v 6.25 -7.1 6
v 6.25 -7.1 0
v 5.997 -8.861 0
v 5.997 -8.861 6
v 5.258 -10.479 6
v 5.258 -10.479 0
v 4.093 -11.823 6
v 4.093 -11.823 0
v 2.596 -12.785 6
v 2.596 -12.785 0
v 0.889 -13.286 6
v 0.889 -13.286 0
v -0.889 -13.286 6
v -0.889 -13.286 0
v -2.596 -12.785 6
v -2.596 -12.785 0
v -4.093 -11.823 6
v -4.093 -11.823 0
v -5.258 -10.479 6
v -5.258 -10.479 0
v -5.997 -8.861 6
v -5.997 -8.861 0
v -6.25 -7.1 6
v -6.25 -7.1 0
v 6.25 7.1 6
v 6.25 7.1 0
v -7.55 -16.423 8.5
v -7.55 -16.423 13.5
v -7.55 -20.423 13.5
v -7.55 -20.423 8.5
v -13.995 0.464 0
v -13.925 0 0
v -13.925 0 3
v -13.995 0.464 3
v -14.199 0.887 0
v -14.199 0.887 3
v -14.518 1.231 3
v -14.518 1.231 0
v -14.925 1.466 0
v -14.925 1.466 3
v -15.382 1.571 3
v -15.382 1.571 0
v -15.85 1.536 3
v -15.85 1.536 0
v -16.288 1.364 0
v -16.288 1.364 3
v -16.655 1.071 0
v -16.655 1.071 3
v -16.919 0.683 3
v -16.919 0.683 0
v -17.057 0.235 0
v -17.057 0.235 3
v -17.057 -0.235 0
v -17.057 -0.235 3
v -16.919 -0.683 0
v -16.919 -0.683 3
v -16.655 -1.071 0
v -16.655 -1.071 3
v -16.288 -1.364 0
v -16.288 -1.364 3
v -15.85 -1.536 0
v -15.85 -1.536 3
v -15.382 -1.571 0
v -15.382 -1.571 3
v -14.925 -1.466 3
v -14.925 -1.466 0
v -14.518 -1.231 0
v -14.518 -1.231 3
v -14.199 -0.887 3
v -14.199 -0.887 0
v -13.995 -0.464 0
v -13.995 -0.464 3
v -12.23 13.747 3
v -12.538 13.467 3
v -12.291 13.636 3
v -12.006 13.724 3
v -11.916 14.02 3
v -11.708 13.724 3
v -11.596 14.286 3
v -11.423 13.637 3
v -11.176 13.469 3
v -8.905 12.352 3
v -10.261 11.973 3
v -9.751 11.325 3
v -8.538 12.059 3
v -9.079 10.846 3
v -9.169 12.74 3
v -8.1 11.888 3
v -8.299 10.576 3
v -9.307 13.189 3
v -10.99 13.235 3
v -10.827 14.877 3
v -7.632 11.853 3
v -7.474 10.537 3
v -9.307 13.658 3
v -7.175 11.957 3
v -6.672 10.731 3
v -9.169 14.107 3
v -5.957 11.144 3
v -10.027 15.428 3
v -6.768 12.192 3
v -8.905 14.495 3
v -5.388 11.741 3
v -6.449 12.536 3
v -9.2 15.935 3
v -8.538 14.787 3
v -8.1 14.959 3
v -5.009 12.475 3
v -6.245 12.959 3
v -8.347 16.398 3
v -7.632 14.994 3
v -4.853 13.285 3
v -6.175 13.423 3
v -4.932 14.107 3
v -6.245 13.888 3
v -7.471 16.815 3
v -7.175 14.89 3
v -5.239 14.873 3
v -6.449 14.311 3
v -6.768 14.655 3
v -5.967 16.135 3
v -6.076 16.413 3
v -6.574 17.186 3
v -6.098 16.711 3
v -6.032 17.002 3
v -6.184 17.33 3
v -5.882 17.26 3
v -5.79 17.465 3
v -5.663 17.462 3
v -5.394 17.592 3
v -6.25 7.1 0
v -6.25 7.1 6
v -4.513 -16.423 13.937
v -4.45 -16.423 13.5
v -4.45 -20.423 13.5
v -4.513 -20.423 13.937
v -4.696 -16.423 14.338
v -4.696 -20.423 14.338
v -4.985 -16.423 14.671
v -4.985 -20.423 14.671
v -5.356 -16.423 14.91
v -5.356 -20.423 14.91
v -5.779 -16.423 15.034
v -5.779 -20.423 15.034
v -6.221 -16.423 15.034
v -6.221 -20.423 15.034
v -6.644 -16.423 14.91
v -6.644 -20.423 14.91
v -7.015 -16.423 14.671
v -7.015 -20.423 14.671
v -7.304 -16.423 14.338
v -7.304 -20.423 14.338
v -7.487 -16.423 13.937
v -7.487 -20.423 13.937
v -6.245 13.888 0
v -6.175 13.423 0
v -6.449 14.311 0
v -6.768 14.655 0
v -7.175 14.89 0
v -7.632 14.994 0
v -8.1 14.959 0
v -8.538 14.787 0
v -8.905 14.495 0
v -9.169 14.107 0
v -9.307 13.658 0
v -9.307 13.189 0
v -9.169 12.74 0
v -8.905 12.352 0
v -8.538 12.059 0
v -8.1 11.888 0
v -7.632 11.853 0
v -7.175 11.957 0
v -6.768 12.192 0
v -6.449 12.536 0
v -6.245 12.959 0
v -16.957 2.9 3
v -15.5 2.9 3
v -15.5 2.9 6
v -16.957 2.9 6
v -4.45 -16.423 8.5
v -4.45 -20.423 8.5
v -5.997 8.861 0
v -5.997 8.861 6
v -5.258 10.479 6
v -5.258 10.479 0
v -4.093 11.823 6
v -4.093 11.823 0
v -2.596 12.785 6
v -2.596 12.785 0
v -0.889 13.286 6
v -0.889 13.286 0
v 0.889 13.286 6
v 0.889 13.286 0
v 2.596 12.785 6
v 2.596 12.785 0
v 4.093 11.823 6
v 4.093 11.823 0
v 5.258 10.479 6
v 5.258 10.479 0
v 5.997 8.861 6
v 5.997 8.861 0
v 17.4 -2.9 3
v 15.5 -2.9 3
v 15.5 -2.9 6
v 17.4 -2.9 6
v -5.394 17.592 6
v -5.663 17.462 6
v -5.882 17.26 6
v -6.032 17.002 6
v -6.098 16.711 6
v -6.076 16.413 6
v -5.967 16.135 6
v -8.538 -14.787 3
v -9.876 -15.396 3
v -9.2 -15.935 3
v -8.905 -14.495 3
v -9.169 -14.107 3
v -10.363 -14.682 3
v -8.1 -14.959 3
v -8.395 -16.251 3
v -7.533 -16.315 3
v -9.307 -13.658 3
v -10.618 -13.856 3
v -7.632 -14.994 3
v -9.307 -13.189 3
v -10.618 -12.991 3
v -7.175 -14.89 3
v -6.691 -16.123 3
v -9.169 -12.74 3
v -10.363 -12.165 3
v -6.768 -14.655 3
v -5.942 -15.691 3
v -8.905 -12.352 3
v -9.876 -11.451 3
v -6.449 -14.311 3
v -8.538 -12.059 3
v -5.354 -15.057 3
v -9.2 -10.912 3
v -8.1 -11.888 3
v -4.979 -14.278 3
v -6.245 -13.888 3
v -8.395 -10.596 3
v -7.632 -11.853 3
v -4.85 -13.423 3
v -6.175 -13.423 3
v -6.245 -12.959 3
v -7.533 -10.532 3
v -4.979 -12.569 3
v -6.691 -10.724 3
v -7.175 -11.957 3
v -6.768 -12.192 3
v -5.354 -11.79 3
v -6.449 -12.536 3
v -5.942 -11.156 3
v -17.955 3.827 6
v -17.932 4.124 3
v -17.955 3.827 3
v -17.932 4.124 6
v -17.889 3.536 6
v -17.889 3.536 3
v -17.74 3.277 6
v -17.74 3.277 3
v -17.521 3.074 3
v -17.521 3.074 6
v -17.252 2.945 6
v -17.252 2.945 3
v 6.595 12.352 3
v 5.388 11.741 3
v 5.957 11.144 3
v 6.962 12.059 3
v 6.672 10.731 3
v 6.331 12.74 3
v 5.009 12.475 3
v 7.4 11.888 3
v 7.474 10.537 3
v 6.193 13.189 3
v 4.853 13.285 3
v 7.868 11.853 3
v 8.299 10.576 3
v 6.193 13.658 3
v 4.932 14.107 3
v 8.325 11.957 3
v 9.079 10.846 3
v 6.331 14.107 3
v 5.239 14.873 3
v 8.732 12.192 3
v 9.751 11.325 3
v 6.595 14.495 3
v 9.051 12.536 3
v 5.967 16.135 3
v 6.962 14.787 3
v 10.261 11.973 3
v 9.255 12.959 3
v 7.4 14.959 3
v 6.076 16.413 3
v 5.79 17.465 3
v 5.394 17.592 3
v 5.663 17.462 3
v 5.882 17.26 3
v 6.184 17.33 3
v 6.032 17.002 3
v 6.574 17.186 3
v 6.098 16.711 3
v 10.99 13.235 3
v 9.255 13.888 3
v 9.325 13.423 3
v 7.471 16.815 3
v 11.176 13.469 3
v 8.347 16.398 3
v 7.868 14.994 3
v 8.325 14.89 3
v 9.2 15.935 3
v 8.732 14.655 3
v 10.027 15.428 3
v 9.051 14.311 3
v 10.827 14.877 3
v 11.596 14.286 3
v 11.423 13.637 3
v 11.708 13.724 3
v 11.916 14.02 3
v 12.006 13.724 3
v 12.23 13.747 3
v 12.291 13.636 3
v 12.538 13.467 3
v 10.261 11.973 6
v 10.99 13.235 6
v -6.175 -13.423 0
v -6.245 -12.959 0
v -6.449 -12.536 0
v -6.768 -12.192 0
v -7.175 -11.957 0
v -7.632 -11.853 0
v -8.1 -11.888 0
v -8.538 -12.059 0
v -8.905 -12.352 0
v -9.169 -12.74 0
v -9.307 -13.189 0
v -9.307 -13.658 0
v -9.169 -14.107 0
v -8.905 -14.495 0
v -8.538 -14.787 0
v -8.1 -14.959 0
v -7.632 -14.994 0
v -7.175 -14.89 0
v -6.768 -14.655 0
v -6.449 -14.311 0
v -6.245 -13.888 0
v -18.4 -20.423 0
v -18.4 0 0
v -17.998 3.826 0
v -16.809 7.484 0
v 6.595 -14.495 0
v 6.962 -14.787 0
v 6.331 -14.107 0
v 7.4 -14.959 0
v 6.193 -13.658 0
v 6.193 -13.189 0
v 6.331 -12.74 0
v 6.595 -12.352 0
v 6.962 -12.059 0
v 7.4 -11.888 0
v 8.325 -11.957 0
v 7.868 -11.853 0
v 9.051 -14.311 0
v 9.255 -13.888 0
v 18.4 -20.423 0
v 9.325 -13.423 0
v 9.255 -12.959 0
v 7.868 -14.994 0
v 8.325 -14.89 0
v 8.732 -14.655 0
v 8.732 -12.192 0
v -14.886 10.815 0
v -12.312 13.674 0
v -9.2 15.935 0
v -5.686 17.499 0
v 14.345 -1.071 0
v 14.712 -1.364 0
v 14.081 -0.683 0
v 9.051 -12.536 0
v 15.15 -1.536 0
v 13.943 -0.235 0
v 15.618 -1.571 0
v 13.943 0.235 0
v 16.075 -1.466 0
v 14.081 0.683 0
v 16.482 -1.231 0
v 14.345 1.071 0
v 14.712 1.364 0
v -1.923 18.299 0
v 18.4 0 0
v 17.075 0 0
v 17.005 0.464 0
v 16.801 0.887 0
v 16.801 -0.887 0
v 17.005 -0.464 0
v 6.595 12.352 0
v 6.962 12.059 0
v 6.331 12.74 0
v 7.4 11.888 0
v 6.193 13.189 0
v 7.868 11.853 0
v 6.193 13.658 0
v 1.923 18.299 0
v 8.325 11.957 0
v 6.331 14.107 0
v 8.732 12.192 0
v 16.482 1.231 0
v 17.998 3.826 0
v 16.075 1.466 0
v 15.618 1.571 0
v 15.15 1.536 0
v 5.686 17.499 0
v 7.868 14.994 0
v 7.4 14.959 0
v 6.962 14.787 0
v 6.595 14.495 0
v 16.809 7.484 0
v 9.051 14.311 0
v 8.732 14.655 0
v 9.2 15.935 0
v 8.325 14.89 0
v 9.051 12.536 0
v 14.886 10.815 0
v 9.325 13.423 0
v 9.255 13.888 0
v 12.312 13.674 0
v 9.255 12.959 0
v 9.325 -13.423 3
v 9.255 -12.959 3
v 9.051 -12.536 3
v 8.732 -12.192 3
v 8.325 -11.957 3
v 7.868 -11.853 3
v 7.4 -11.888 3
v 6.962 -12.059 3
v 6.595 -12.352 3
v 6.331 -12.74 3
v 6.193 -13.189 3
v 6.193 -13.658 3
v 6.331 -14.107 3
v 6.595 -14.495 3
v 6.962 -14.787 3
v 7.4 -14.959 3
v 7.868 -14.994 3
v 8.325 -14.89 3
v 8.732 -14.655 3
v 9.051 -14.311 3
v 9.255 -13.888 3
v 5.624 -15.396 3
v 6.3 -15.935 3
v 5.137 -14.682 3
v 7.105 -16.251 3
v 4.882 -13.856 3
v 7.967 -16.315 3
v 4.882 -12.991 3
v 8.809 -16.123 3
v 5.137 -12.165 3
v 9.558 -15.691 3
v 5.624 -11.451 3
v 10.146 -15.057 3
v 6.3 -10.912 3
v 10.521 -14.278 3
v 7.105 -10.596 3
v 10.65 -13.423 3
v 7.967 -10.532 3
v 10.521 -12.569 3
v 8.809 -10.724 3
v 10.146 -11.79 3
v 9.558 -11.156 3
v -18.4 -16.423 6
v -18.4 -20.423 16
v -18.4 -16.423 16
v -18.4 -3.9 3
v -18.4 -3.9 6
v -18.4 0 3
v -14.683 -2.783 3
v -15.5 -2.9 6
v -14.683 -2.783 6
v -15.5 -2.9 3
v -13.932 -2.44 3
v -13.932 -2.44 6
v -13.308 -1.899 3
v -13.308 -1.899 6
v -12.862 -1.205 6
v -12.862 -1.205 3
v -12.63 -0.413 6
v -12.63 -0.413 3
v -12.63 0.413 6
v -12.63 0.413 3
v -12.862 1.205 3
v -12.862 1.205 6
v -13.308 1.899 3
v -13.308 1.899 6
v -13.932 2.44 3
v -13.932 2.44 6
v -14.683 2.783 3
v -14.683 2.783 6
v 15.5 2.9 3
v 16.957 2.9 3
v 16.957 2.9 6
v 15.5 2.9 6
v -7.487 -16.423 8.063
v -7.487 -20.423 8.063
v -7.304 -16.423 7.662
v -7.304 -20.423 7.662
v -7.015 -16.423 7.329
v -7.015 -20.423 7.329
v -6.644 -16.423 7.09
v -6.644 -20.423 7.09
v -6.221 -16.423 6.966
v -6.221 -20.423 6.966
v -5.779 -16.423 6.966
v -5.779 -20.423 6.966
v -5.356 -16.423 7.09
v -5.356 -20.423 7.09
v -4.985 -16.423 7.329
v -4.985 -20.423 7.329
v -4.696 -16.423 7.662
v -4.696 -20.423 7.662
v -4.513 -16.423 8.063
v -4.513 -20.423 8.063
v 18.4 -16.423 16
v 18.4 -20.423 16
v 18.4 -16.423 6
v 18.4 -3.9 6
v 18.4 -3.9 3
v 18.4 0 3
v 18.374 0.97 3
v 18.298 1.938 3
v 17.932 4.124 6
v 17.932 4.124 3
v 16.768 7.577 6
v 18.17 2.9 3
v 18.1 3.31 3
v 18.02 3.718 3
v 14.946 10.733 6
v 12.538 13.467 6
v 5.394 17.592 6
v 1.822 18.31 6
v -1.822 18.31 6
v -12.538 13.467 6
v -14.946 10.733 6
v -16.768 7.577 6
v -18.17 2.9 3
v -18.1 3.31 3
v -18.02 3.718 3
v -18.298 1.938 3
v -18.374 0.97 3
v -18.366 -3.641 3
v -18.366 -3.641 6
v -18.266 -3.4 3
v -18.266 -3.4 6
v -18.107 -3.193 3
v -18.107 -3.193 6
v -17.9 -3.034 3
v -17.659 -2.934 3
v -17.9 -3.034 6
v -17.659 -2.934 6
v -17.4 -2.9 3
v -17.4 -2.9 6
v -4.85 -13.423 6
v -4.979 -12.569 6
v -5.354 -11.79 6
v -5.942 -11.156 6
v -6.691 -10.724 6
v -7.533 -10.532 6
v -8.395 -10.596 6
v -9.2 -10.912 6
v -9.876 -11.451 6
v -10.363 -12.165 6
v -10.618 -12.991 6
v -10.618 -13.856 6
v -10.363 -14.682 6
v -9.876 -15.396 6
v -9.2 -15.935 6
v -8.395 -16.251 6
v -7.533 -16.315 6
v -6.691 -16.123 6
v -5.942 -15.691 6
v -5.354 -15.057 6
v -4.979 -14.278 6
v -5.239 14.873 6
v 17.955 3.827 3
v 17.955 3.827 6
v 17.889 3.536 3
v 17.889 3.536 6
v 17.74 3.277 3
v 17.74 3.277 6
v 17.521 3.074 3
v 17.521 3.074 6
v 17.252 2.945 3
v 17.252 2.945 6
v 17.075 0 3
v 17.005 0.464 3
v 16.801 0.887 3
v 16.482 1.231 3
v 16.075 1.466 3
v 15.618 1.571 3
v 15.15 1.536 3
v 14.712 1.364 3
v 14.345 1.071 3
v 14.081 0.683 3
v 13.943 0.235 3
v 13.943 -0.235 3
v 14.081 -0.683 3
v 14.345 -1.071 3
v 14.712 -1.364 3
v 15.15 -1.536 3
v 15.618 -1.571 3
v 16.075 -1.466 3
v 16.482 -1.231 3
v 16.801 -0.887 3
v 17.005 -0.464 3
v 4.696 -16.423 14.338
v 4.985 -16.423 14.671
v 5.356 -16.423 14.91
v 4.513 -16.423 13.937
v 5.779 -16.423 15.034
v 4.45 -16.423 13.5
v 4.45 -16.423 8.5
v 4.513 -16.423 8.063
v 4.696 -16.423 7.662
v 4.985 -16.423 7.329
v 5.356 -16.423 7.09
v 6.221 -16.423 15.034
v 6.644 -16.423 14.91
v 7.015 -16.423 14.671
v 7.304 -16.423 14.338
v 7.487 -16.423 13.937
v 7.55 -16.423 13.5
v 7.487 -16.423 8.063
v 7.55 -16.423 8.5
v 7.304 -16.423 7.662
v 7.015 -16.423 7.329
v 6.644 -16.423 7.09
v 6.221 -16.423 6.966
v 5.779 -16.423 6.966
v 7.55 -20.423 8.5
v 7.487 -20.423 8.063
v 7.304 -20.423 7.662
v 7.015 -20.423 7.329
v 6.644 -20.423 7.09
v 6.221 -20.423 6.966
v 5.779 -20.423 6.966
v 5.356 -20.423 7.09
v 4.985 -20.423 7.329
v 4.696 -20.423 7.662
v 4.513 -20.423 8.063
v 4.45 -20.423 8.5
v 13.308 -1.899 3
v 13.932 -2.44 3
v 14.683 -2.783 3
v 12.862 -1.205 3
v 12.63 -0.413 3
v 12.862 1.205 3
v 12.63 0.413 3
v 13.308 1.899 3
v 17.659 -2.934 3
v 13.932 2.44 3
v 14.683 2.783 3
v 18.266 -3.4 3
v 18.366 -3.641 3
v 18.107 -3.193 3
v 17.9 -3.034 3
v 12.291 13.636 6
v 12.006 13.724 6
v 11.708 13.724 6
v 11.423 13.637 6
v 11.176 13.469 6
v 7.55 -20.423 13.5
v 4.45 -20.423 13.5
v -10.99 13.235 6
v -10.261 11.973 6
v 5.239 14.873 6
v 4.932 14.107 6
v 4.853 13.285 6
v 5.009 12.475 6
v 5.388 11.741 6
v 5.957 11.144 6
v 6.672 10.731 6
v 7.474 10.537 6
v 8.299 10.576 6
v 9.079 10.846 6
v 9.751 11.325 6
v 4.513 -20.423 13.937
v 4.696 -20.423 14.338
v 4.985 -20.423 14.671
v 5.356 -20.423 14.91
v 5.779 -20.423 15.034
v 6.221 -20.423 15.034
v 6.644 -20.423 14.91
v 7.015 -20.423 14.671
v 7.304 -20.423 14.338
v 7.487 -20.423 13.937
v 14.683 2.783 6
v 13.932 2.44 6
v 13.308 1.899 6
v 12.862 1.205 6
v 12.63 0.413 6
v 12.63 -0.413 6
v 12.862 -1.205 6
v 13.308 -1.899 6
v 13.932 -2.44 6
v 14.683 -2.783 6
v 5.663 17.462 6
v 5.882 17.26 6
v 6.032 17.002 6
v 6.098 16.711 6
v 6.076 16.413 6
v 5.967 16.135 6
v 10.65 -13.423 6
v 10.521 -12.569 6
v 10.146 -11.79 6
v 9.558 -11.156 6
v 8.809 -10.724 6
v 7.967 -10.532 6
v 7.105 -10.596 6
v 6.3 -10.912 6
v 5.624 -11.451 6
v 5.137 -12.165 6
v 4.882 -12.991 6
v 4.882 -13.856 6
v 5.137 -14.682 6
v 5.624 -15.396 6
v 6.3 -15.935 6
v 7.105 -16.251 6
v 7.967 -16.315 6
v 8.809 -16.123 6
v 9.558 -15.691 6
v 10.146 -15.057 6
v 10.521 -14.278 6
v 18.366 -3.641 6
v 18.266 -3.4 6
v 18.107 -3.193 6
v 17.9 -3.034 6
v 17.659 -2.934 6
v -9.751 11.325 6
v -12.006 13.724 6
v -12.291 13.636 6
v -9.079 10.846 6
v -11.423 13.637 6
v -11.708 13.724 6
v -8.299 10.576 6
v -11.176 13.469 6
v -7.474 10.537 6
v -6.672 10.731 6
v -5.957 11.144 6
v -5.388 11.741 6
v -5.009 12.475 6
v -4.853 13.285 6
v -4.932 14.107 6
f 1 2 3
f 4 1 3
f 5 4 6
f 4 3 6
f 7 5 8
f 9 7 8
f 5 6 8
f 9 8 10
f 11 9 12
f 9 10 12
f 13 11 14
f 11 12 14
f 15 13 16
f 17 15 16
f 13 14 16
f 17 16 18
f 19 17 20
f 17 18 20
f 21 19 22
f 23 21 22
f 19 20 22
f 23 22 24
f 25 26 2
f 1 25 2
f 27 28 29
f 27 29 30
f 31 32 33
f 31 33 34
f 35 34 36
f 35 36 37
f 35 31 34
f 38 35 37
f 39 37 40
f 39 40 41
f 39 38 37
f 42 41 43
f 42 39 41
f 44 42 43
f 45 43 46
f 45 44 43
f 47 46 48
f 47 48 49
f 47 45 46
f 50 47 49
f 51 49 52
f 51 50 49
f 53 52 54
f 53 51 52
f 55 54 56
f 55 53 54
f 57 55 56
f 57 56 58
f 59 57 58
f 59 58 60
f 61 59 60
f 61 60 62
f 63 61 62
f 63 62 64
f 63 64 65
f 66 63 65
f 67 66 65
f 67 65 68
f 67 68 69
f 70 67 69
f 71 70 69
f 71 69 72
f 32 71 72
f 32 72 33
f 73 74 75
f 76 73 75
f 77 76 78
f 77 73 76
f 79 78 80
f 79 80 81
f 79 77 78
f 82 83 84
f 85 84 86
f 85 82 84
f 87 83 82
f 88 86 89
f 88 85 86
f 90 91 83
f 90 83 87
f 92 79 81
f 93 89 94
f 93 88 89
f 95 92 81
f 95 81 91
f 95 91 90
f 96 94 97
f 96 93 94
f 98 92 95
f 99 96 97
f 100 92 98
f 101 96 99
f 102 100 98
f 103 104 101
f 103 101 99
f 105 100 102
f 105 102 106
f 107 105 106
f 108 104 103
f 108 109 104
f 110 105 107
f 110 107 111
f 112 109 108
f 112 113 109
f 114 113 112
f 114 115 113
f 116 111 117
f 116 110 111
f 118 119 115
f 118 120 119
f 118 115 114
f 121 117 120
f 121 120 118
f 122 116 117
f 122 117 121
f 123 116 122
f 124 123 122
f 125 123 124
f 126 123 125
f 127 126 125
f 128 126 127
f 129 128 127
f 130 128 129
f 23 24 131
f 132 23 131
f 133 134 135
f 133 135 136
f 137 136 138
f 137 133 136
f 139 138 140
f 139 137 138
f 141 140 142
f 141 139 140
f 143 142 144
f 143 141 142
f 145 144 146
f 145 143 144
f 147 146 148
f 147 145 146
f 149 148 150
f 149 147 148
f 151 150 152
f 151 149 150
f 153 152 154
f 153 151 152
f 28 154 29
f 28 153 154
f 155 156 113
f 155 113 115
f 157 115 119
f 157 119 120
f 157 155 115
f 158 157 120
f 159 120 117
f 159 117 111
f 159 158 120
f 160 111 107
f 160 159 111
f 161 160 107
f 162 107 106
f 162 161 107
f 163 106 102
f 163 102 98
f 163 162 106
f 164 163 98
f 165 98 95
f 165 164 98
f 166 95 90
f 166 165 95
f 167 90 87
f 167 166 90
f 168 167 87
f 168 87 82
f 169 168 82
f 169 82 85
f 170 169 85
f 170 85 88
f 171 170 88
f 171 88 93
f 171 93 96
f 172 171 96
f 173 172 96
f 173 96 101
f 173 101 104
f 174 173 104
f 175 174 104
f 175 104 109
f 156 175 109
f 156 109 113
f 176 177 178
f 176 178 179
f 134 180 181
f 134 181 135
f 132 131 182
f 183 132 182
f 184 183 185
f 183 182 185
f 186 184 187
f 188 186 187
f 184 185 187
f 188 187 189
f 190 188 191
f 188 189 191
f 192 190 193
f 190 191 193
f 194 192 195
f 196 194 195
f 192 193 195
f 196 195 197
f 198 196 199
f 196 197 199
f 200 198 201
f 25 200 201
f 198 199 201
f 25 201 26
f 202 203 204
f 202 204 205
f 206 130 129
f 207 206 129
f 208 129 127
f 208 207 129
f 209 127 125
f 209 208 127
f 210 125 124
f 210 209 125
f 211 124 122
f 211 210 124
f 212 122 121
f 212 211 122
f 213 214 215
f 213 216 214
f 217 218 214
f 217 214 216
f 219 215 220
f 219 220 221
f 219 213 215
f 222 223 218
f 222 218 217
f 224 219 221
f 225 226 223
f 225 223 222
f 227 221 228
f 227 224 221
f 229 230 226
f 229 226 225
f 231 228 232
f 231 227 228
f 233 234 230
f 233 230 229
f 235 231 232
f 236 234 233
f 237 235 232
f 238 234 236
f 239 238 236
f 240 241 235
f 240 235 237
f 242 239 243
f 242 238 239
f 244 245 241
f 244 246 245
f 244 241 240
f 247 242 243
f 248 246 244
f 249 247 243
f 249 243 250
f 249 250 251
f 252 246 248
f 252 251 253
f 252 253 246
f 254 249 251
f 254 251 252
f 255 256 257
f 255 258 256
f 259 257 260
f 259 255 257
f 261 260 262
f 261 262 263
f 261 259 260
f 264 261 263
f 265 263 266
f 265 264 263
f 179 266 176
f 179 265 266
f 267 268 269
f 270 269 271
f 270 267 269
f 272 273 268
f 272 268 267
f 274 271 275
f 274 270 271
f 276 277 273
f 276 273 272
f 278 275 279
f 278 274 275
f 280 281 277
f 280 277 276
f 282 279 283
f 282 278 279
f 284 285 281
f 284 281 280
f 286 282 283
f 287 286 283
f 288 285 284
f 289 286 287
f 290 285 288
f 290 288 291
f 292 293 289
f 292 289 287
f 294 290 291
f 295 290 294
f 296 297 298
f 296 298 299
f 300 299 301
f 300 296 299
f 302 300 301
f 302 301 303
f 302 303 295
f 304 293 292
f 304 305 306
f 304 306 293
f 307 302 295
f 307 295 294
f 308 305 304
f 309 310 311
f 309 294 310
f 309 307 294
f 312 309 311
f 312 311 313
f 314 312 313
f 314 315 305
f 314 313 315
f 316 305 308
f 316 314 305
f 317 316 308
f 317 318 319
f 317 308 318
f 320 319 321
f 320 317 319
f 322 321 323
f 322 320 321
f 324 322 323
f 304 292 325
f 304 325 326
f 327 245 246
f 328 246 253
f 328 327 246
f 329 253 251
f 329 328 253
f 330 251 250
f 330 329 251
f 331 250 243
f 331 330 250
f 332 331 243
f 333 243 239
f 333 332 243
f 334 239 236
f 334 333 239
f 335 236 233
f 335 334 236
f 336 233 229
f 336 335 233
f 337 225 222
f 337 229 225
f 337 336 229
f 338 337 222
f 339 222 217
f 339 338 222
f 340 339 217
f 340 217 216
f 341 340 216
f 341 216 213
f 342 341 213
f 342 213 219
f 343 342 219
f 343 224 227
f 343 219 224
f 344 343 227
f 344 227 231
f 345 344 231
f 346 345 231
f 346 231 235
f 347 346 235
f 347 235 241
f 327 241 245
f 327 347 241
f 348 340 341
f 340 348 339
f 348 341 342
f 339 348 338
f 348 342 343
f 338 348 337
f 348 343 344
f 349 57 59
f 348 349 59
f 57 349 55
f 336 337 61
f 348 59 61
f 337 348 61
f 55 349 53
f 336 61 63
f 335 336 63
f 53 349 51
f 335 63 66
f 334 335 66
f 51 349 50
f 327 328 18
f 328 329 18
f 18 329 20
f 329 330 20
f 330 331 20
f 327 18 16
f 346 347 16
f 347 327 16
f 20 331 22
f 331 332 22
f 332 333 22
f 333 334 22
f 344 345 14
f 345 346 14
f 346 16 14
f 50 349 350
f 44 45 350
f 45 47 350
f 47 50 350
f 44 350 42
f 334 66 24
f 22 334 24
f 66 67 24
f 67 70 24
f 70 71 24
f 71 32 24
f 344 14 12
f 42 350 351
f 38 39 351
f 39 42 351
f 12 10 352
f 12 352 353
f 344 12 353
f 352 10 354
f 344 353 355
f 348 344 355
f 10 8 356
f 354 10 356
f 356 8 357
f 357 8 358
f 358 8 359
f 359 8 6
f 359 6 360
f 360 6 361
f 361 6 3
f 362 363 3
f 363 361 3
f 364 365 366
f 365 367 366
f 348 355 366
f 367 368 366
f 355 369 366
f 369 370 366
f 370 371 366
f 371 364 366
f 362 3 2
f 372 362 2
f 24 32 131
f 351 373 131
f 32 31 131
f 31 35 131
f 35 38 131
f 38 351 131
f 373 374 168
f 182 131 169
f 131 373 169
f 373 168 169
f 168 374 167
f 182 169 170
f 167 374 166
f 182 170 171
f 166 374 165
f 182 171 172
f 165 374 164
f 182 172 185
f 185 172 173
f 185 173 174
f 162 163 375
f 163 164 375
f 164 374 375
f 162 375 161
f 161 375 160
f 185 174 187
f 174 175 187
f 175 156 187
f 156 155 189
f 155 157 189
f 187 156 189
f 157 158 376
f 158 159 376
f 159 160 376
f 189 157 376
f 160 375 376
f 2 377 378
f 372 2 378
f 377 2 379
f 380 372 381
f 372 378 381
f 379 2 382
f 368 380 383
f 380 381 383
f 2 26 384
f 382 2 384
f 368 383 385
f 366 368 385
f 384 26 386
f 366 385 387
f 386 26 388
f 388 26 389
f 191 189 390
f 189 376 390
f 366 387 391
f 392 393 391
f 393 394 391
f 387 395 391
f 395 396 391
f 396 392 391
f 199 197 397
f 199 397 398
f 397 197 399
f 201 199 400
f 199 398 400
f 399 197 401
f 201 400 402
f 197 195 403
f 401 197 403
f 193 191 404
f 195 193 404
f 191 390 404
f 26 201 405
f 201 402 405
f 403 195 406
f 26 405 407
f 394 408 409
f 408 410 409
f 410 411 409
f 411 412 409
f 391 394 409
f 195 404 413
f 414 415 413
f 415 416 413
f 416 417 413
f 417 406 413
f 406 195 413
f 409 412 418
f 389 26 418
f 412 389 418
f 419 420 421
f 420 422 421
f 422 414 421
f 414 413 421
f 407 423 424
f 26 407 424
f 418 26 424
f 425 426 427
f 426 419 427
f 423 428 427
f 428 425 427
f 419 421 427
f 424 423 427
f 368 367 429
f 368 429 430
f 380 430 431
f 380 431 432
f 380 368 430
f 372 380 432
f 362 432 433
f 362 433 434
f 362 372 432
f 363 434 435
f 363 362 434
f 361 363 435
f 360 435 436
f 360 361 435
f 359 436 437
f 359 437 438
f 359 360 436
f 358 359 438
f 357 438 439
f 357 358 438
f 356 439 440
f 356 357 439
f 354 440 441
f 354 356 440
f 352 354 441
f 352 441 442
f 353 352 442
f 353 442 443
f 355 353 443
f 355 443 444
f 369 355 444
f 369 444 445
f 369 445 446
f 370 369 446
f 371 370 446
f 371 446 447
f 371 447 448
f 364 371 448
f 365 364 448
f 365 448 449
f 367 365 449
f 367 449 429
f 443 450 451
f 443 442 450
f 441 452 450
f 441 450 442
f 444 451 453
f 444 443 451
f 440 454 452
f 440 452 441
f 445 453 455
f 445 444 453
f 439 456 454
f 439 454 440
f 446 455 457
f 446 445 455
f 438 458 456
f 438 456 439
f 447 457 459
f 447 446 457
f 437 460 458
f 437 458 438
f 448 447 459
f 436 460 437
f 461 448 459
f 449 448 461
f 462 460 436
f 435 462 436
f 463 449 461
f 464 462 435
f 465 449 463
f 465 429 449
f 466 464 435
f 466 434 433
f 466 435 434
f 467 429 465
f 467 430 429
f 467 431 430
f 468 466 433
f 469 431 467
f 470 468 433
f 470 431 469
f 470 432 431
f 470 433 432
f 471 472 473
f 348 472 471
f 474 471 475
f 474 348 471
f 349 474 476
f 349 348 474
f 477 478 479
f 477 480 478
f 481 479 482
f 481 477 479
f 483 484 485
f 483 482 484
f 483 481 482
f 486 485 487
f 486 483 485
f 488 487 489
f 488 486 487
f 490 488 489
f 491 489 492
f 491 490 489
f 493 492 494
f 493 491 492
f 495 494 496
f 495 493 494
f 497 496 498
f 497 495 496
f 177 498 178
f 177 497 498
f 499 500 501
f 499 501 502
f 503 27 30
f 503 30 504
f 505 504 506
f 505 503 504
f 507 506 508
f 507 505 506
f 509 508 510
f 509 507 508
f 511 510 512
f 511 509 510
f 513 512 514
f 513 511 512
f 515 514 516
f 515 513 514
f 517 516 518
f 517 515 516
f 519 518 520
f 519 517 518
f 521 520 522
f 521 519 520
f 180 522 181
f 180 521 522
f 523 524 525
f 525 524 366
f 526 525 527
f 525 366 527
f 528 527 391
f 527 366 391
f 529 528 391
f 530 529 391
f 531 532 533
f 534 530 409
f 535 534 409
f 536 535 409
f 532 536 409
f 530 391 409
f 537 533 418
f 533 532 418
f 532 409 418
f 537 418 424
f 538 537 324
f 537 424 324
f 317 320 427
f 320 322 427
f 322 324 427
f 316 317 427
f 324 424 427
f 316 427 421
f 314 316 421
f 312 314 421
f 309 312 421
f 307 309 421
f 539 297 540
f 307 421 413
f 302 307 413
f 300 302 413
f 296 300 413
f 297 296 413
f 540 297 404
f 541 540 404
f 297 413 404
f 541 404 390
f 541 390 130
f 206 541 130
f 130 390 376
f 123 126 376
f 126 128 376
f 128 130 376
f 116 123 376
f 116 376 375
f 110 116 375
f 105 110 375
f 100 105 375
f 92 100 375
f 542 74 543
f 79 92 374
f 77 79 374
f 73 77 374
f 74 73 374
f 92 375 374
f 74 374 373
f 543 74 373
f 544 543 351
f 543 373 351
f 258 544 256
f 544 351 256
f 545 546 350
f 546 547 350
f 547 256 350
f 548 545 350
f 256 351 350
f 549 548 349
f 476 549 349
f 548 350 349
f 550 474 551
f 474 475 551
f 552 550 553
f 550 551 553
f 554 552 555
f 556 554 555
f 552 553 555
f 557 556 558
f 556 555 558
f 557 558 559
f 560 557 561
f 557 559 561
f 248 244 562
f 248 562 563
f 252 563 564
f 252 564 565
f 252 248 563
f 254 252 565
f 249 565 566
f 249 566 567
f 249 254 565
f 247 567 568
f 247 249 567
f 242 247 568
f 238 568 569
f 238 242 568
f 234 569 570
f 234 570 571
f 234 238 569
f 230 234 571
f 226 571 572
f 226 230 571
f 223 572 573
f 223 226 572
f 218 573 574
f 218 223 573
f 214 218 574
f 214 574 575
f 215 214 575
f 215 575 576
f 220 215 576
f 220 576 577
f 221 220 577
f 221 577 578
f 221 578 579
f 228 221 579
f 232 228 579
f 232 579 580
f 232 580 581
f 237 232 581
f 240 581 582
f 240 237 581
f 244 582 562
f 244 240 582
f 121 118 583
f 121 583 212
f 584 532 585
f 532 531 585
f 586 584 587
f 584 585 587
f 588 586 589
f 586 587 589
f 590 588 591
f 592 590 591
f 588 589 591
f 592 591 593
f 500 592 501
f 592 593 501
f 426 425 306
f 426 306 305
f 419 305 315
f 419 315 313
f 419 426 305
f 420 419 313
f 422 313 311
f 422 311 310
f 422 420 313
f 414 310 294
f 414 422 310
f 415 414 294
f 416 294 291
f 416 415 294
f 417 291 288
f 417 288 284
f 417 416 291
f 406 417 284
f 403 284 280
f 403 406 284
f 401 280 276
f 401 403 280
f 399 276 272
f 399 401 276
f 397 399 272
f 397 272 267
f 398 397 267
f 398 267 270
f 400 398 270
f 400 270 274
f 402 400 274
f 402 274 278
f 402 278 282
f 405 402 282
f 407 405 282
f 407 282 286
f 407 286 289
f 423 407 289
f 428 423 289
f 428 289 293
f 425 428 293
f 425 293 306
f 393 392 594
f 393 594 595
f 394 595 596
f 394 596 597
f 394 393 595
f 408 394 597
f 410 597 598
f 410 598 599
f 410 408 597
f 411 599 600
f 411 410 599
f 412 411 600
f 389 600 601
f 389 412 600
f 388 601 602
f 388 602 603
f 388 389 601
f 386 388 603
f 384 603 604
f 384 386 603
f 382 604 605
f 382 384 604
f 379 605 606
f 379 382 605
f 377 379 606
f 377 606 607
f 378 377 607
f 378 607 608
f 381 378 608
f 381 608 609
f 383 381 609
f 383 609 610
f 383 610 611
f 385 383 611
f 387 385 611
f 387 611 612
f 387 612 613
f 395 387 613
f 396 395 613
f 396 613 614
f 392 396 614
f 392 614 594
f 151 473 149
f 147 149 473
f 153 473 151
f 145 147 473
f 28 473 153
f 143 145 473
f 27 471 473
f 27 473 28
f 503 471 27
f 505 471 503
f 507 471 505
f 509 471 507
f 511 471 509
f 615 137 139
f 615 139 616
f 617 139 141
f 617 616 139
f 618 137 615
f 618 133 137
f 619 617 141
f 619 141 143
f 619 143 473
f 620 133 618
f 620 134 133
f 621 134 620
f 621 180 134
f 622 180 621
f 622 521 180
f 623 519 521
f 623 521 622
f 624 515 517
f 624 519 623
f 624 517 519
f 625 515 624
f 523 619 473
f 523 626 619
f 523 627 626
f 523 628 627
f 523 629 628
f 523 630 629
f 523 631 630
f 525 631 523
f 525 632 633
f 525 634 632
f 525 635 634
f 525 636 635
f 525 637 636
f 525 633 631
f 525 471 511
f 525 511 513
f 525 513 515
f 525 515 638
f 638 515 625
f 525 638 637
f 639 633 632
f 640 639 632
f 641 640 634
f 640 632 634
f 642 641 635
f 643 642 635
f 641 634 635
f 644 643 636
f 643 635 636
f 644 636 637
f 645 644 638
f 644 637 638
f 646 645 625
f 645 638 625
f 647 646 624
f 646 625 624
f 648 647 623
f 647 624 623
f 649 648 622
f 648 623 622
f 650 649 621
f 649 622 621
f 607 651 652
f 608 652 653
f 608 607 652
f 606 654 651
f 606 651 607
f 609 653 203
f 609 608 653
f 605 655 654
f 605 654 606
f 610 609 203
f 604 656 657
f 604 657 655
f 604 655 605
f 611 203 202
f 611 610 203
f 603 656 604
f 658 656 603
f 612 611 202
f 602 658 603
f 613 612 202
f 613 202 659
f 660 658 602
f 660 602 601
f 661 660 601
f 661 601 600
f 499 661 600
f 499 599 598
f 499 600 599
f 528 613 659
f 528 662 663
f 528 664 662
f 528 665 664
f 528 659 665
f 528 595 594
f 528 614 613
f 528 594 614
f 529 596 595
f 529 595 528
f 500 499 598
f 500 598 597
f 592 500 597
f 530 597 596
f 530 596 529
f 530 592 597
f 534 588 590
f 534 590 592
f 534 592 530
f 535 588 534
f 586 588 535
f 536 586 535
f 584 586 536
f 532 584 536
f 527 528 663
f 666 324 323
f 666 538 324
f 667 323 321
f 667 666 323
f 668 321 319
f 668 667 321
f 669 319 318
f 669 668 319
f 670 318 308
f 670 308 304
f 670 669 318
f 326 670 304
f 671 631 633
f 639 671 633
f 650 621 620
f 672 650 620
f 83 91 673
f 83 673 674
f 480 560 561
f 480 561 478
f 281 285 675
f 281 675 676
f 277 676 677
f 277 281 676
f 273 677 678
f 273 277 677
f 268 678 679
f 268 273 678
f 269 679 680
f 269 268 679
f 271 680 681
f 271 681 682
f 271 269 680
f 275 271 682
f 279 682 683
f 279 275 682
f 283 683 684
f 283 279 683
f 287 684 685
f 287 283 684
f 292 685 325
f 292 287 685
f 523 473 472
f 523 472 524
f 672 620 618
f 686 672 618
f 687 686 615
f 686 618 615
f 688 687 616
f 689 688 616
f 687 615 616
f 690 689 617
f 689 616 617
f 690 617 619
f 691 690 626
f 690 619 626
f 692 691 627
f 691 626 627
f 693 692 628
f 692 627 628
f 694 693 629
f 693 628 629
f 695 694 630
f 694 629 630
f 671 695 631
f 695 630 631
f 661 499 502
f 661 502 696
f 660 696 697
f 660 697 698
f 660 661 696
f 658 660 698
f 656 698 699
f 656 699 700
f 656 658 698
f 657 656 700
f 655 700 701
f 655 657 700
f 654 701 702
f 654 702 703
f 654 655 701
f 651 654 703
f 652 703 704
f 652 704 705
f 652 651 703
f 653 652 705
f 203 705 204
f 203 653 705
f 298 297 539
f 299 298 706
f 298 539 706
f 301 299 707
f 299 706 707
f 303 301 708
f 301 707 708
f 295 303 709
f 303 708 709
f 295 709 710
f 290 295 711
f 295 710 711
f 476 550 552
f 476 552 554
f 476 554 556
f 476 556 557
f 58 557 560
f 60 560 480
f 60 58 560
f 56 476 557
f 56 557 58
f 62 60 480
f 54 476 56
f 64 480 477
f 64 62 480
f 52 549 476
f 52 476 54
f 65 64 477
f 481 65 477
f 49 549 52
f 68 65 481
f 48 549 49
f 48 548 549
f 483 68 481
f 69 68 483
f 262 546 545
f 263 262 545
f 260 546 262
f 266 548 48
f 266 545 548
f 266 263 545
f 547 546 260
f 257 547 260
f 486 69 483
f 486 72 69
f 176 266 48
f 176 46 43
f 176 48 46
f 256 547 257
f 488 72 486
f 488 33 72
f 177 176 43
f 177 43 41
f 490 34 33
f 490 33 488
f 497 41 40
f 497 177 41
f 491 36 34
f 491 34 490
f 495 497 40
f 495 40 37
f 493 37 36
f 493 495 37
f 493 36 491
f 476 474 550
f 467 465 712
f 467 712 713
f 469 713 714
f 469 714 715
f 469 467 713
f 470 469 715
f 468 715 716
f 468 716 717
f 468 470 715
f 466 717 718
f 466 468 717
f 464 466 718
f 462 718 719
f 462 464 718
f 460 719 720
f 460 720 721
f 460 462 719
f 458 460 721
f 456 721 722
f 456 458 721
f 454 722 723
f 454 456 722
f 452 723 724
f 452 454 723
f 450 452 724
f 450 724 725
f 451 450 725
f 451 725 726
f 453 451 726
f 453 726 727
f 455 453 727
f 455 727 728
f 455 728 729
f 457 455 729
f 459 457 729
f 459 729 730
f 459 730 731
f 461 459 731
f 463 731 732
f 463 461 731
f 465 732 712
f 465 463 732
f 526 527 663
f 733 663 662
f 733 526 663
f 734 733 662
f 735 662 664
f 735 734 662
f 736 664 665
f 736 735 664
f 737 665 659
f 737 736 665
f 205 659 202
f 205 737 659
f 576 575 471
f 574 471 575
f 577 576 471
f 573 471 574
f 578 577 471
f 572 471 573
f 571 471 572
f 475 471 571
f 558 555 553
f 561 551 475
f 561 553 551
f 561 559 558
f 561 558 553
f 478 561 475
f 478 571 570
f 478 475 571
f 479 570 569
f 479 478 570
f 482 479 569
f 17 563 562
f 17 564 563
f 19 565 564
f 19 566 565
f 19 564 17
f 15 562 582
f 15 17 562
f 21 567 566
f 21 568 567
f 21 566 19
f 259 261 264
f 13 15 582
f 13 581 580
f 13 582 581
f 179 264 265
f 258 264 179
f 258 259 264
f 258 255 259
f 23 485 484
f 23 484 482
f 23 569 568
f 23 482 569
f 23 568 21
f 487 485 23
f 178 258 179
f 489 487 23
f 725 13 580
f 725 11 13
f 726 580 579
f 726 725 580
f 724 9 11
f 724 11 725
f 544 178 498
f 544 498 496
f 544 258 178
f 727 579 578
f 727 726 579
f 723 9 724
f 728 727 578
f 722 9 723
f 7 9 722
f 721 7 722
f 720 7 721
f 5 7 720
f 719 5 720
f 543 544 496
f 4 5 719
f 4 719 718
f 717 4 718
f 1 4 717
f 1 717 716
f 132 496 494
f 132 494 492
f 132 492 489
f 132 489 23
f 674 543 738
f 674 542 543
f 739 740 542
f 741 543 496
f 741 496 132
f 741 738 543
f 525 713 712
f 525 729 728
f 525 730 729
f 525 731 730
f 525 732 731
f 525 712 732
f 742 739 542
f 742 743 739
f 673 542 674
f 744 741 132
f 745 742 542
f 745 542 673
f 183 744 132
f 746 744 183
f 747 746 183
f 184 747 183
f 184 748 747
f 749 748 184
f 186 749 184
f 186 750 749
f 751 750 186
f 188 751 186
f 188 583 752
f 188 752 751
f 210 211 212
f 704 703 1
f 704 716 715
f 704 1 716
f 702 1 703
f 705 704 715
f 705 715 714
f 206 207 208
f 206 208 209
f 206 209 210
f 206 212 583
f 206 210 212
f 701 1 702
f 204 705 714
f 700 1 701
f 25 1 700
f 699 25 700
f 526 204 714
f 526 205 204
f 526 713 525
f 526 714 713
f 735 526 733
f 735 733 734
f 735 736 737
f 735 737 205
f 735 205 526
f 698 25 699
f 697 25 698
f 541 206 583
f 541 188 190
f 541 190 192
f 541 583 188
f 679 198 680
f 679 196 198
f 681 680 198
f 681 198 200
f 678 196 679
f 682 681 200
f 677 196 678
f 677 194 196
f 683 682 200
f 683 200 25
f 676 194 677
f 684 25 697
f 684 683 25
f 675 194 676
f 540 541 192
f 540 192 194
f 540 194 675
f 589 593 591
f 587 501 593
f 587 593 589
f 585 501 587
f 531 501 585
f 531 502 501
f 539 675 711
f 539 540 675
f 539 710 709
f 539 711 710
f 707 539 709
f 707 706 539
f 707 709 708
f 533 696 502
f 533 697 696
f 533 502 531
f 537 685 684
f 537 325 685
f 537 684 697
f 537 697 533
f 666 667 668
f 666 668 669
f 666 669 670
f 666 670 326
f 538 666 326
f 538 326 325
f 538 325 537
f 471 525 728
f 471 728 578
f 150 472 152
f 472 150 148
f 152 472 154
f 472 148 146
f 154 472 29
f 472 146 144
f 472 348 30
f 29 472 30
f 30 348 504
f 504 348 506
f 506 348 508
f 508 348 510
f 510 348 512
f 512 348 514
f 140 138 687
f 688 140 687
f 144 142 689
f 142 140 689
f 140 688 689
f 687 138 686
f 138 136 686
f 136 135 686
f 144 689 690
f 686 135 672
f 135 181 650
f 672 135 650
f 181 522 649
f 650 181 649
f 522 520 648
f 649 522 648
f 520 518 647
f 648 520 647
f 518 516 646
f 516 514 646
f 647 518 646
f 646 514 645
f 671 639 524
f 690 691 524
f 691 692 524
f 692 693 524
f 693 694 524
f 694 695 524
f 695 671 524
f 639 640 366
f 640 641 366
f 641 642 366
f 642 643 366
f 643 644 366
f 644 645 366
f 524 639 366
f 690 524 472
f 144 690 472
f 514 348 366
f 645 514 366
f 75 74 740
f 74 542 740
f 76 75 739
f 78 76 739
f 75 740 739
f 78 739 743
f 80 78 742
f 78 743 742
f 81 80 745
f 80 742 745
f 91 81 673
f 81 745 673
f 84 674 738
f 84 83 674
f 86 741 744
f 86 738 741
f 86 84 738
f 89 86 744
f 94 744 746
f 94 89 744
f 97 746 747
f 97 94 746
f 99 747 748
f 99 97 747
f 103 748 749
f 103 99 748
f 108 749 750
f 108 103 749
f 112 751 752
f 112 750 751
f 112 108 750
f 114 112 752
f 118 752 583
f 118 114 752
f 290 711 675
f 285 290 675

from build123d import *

# Parameters (mm, degrees)
SKETCH1_R           = 1.575
BOSS_EXTRUDE1_DEPTH = 6
CUT_EXTRUDE3_START  = -3
SKETCH2_R           = 2.9
SKETCH2_R_2         = 1.575
CUT_EXTRUDE3_DEPTH  = 3
CUT_EXTRUDE4_START  = -3
SKETCH2_3_R         = 2.9
SKETCH2_3_R_2       = 1.575
CUT_EXTRUDE4_DEPTH  = 3
SKETCH3_W           = 36.8
SKETCH3_H           = 4
BOSS_EXTRUDE2_DEPTH = 16
CUT_EXTRUDE5_DEPTH  = 10
FILLET2_R           = 1


with BuildPart() as part:
    # Sketch1 → Boss-Extrude1 (new body)
    # profile 1 of 2: a face of its own
    with BuildSketch(Plane.XY):
        with BuildLine():
            ThreePointArc((18.4, 0), (0, 18.4), (-18.4, 0))
            ThreePointArc((-18.4, 0), (0, -18.4), (18.4, 0))
        make_face()
        with Locations((-7.75, -13.423393759)):
            Circle(SKETCH1_R, mode=Mode.SUBTRACT)
        with Locations((7.75, -13.423393759)):
            Circle(SKETCH1_R, mode=Mode.SUBTRACT)
        with Locations((-15.5, 0)):
            Circle(SKETCH1_R, mode=Mode.SUBTRACT)
        with Locations((-7.75, 13.423393759)):
            Circle(SKETCH1_R, mode=Mode.SUBTRACT)
        with BuildLine():
            ThreePointArc((6.25, -7.1), (0, -13.35), (-6.25, -7.1))
            Line((-6.25, -7.1), (-6.25, 7.1))
            ThreePointArc((-6.25, 7.1), (0, 13.35), (6.25, 7.1))
            Line((6.25, 7.1), (6.25, -7.1))
        make_face(mode=Mode.SUBTRACT)
        with Locations((15.5, 0)):
            Circle(SKETCH1_R, mode=Mode.SUBTRACT)
        with Locations((7.75, 13.423393759)):
            Circle(SKETCH1_R, mode=Mode.SUBTRACT)
    # profile 2 of 2: a face of its own
    with BuildSketch(Plane.XY):
        with BuildLine():
            ThreePointArc((18.4, 0), (0, -18.4), (-18.4, 0))
            Line((-18.4, 0), (-18.4, -19))
            Line((-18.4, -19), (18.4, -19))
            Line((18.4, -19), (18.4, 0))
        make_face()
    extrude(amount=BOSS_EXTRUDE1_DEPTH)

    # Sketch2 → Cut-Extrude3 (cut)
    # profile 1 of 12: a face of its own
    with BuildSketch(Plane.XY.offset(6).offset(CUT_EXTRUDE3_START)):
        with Locations((-15.5, 0)):
            Circle(SKETCH2_R)
        with Locations((-15.5, 0)):
            Circle(SKETCH2_R_2, mode=Mode.SUBTRACT)
    # profile 2 of 12: a face of its own
    with BuildSketch(Plane.XY.offset(6).offset(CUT_EXTRUDE3_START)):
        with BuildLine():
            ThreePointArc((-18.4, 0), (-17.550609665, 2.050609665), (-15.5, 2.9))
            Line((-15.5, 2.9), (-18.17003027, 2.9))
            ThreePointArc((-18.17003027, 2.9), (-18.342417466, 1.454551999), (-18.4, 0))
        make_face()
    # profile 3 of 12: a face of its own
    with BuildSketch(Plane.XY.offset(6).offset(CUT_EXTRUDE3_START)):
        with BuildLine():
            ThreePointArc((-15.5, -2.9), (-17.550609665, -2.050609665), (-18.4, 0))
            Line((-18.4, 0), (-18.4, -2.9))
            Line((-18.4, -2.9), (-15.5, -2.9))
        make_face()
    # profile 4 of 12: a face of its own
    with BuildSketch(Plane.XY.offset(6).offset(CUT_EXTRUDE3_START)):
        with BuildLine():
            ThreePointArc((-6.573541464, 17.185707801), (-7.911529831, 16.612275453), (-9.200000154, 15.934867341))
            ThreePointArc((-9.200000154, 15.934867341), (-6.999424855, 16.224578678), (-5.238526329, 14.873393759))
            Line((-5.238526329, 14.873393759), (-6.573541464, 17.185707801))
        make_face()
    # profile 5 of 12: a face of its own
    with BuildSketch(Plane.XY.offset(6).offset(CUT_EXTRUDE3_START)):
        with BuildLine():
            ThreePointArc((-9.200000154, 15.934867341), (-10.430887789, 15.157723442), (-11.596488806, 14.285707801))
            Line((-11.596488806, 14.285707801), (-10.261473671, 11.973393759))
            ThreePointArc((-10.261473671, 11.973393759), (-10.551184919, 14.173968903), (-9.200000154, 15.934867341))
        make_face()
    # profile 6 of 12: a face of its own
    with BuildSketch(Plane.XY.offset(6).offset(CUT_EXTRUDE3_START)):
        with Locations((-7.75, 13.423393759)):
            Circle(SKETCH2_R)
        with Locations((-7.75, 13.423393759)):
            Circle(SKETCH2_R_2, mode=Mode.SUBTRACT)
    # profile 7 of 12: a face of its own
    with BuildSketch(Plane.XY.offset(6).offset(CUT_EXTRUDE3_START)):
        with BuildLine():
            ThreePointArc((9.200000155, 15.93486734), (7.911529831, 16.612275453), (6.573541464, 17.185707801))
            Line((6.573541464, 17.185707801), (5.238526329, 14.873393759))
            ThreePointArc((5.238526329, 14.873393759), (6.999424856, 16.224578678), (9.200000155, 15.93486734))
        make_face()
    # profile 8 of 12: a face of its own
    with BuildSketch(Plane.XY.offset(6).offset(CUT_EXTRUDE3_START)):
        with Locations((7.75, 13.423393759)):
            Circle(SKETCH2_R)
        with Locations((7.75, 13.423393759)):
            Circle(SKETCH2_R_2, mode=Mode.SUBTRACT)
    # profile 9 of 12: a face of its own
    with BuildSketch(Plane.XY.offset(6).offset(CUT_EXTRUDE3_START)):
        with BuildLine():
            ThreePointArc((11.596488806, 14.285707801), (10.430887789, 15.157723441), (9.200000155, 15.93486734))
            ThreePointArc((9.200000155, 15.93486734), (10.261473716, 14.873393681), (10.65, 13.423393759))
            ThreePointArc((10.65, 13.423393759), (10.551184896, 12.672818528), (10.261473671, 11.973393759))
            Line((10.261473671, 11.973393759), (11.596488806, 14.285707801))
        make_face()
    # profile 10 of 12: a face of its own
    with BuildSketch(Plane.XY.offset(6).offset(CUT_EXTRUDE3_START)):
        with BuildLine():
            ThreePointArc((18.4, 0), (18.342417466, 1.454551999), (18.17003027, 2.9))
            Line((18.17003027, 2.9), (15.5, 2.9))
            ThreePointArc((15.5, 2.9), (17.550609665, 2.050609665), (18.4, 0))
        make_face()
    # profile 11 of 12: a face of its own
    with BuildSketch(Plane.XY.offset(6).offset(CUT_EXTRUDE3_START)):
        with Locations((15.5, 0)):
            Circle(SKETCH2_R)
        with Locations((15.5, 0)):
            Circle(SKETCH2_R_2, mode=Mode.SUBTRACT)
    # profile 12 of 12: a face of its own
    with BuildSketch(Plane.XY.offset(6).offset(CUT_EXTRUDE3_START)):
        with BuildLine():
            Line((18.4, -2.9), (18.4, 0))
            ThreePointArc((18.4, 0), (17.550609665, -2.050609665), (15.5, -2.9))
            Line((15.5, -2.9), (18.4, -2.9))
        make_face()
    extrude(amount=CUT_EXTRUDE3_DEPTH, mode=Mode.SUBTRACT)

    # Sketch2<3> → Cut-Extrude4 (cut)
    # profile 1 of 2: a face of its own
    with BuildSketch(Plane.XY.offset(6).offset(CUT_EXTRUDE4_START)):
        with Locations((7.75, -13.423393759)):
            Circle(SKETCH2_3_R)
        with Locations((7.75, -13.423393759)):
            Circle(SKETCH2_3_R_2, mode=Mode.SUBTRACT)
    # profile 2 of 2: a face of its own
    with BuildSketch(Plane.XY.offset(6).offset(CUT_EXTRUDE4_START)):
        with Locations((-7.75, -13.423393759)):
            Circle(SKETCH2_3_R)
    extrude(amount=CUT_EXTRUDE4_DEPTH, mode=Mode.SUBTRACT)

    # Sketch3 → Boss-Extrude2 (add)
    with BuildSketch(Plane.XY):
        with Locations((0, -18.423393759)):
            Rectangle(SKETCH3_W, SKETCH3_H)
    extrude(amount=BOSS_EXTRUDE2_DEPTH)

    # Sketch4 → Cut-Extrude5 (cut)
    with BuildSketch(Plane(origin=(0, -16.423393759, 0), x_dir=(1, 0, 0), z_dir=(0, 1, 0))):
        with BuildLine():
            Line((-4.45, -8.5), (-4.45, -13.5))
            ThreePointArc((-4.45, -13.5), (-6, -15.05), (-7.55, -13.5))
            Line((-7.55, -13.5), (-7.55, -8.5))
            ThreePointArc((-7.55, -8.5), (-6, -6.95), (-4.45, -8.5))
        make_face()
        with BuildLine():
            Line((4.45, -8.5), (4.45, -13.5))
            ThreePointArc((4.45, -13.5), (6, -15.05), (7.55, -13.5))
            Line((7.55, -13.5), (7.55, -8.5))
            ThreePointArc((7.55, -8.5), (6, -6.95), (4.45, -8.5))
        make_face()
    extrude(amount=-CUT_EXTRUDE5_DEPTH, mode=Mode.SUBTRACT)

    # Fillet2
    fillet2_edges = [part.edges().sort_by_distance(p)[0] for p in [
        (-18.4, -2.9, 4.5),
        (-18.17003027, 2.9, 4.5),
        (-11.596488806, 14.285707801, 4.5),
        (-6.573541464, 17.185707801, 4.5),
        (6.573541464, 17.185707801, 4.5),
        (11.596488806, 14.285707801, 4.5),
        (18.17003027, 2.9, 4.5),
        (18.4, -2.9, 4.5),
    ]]
    fillet(fillet2_edges, radius=FILLET2_R)


solid = part.part
